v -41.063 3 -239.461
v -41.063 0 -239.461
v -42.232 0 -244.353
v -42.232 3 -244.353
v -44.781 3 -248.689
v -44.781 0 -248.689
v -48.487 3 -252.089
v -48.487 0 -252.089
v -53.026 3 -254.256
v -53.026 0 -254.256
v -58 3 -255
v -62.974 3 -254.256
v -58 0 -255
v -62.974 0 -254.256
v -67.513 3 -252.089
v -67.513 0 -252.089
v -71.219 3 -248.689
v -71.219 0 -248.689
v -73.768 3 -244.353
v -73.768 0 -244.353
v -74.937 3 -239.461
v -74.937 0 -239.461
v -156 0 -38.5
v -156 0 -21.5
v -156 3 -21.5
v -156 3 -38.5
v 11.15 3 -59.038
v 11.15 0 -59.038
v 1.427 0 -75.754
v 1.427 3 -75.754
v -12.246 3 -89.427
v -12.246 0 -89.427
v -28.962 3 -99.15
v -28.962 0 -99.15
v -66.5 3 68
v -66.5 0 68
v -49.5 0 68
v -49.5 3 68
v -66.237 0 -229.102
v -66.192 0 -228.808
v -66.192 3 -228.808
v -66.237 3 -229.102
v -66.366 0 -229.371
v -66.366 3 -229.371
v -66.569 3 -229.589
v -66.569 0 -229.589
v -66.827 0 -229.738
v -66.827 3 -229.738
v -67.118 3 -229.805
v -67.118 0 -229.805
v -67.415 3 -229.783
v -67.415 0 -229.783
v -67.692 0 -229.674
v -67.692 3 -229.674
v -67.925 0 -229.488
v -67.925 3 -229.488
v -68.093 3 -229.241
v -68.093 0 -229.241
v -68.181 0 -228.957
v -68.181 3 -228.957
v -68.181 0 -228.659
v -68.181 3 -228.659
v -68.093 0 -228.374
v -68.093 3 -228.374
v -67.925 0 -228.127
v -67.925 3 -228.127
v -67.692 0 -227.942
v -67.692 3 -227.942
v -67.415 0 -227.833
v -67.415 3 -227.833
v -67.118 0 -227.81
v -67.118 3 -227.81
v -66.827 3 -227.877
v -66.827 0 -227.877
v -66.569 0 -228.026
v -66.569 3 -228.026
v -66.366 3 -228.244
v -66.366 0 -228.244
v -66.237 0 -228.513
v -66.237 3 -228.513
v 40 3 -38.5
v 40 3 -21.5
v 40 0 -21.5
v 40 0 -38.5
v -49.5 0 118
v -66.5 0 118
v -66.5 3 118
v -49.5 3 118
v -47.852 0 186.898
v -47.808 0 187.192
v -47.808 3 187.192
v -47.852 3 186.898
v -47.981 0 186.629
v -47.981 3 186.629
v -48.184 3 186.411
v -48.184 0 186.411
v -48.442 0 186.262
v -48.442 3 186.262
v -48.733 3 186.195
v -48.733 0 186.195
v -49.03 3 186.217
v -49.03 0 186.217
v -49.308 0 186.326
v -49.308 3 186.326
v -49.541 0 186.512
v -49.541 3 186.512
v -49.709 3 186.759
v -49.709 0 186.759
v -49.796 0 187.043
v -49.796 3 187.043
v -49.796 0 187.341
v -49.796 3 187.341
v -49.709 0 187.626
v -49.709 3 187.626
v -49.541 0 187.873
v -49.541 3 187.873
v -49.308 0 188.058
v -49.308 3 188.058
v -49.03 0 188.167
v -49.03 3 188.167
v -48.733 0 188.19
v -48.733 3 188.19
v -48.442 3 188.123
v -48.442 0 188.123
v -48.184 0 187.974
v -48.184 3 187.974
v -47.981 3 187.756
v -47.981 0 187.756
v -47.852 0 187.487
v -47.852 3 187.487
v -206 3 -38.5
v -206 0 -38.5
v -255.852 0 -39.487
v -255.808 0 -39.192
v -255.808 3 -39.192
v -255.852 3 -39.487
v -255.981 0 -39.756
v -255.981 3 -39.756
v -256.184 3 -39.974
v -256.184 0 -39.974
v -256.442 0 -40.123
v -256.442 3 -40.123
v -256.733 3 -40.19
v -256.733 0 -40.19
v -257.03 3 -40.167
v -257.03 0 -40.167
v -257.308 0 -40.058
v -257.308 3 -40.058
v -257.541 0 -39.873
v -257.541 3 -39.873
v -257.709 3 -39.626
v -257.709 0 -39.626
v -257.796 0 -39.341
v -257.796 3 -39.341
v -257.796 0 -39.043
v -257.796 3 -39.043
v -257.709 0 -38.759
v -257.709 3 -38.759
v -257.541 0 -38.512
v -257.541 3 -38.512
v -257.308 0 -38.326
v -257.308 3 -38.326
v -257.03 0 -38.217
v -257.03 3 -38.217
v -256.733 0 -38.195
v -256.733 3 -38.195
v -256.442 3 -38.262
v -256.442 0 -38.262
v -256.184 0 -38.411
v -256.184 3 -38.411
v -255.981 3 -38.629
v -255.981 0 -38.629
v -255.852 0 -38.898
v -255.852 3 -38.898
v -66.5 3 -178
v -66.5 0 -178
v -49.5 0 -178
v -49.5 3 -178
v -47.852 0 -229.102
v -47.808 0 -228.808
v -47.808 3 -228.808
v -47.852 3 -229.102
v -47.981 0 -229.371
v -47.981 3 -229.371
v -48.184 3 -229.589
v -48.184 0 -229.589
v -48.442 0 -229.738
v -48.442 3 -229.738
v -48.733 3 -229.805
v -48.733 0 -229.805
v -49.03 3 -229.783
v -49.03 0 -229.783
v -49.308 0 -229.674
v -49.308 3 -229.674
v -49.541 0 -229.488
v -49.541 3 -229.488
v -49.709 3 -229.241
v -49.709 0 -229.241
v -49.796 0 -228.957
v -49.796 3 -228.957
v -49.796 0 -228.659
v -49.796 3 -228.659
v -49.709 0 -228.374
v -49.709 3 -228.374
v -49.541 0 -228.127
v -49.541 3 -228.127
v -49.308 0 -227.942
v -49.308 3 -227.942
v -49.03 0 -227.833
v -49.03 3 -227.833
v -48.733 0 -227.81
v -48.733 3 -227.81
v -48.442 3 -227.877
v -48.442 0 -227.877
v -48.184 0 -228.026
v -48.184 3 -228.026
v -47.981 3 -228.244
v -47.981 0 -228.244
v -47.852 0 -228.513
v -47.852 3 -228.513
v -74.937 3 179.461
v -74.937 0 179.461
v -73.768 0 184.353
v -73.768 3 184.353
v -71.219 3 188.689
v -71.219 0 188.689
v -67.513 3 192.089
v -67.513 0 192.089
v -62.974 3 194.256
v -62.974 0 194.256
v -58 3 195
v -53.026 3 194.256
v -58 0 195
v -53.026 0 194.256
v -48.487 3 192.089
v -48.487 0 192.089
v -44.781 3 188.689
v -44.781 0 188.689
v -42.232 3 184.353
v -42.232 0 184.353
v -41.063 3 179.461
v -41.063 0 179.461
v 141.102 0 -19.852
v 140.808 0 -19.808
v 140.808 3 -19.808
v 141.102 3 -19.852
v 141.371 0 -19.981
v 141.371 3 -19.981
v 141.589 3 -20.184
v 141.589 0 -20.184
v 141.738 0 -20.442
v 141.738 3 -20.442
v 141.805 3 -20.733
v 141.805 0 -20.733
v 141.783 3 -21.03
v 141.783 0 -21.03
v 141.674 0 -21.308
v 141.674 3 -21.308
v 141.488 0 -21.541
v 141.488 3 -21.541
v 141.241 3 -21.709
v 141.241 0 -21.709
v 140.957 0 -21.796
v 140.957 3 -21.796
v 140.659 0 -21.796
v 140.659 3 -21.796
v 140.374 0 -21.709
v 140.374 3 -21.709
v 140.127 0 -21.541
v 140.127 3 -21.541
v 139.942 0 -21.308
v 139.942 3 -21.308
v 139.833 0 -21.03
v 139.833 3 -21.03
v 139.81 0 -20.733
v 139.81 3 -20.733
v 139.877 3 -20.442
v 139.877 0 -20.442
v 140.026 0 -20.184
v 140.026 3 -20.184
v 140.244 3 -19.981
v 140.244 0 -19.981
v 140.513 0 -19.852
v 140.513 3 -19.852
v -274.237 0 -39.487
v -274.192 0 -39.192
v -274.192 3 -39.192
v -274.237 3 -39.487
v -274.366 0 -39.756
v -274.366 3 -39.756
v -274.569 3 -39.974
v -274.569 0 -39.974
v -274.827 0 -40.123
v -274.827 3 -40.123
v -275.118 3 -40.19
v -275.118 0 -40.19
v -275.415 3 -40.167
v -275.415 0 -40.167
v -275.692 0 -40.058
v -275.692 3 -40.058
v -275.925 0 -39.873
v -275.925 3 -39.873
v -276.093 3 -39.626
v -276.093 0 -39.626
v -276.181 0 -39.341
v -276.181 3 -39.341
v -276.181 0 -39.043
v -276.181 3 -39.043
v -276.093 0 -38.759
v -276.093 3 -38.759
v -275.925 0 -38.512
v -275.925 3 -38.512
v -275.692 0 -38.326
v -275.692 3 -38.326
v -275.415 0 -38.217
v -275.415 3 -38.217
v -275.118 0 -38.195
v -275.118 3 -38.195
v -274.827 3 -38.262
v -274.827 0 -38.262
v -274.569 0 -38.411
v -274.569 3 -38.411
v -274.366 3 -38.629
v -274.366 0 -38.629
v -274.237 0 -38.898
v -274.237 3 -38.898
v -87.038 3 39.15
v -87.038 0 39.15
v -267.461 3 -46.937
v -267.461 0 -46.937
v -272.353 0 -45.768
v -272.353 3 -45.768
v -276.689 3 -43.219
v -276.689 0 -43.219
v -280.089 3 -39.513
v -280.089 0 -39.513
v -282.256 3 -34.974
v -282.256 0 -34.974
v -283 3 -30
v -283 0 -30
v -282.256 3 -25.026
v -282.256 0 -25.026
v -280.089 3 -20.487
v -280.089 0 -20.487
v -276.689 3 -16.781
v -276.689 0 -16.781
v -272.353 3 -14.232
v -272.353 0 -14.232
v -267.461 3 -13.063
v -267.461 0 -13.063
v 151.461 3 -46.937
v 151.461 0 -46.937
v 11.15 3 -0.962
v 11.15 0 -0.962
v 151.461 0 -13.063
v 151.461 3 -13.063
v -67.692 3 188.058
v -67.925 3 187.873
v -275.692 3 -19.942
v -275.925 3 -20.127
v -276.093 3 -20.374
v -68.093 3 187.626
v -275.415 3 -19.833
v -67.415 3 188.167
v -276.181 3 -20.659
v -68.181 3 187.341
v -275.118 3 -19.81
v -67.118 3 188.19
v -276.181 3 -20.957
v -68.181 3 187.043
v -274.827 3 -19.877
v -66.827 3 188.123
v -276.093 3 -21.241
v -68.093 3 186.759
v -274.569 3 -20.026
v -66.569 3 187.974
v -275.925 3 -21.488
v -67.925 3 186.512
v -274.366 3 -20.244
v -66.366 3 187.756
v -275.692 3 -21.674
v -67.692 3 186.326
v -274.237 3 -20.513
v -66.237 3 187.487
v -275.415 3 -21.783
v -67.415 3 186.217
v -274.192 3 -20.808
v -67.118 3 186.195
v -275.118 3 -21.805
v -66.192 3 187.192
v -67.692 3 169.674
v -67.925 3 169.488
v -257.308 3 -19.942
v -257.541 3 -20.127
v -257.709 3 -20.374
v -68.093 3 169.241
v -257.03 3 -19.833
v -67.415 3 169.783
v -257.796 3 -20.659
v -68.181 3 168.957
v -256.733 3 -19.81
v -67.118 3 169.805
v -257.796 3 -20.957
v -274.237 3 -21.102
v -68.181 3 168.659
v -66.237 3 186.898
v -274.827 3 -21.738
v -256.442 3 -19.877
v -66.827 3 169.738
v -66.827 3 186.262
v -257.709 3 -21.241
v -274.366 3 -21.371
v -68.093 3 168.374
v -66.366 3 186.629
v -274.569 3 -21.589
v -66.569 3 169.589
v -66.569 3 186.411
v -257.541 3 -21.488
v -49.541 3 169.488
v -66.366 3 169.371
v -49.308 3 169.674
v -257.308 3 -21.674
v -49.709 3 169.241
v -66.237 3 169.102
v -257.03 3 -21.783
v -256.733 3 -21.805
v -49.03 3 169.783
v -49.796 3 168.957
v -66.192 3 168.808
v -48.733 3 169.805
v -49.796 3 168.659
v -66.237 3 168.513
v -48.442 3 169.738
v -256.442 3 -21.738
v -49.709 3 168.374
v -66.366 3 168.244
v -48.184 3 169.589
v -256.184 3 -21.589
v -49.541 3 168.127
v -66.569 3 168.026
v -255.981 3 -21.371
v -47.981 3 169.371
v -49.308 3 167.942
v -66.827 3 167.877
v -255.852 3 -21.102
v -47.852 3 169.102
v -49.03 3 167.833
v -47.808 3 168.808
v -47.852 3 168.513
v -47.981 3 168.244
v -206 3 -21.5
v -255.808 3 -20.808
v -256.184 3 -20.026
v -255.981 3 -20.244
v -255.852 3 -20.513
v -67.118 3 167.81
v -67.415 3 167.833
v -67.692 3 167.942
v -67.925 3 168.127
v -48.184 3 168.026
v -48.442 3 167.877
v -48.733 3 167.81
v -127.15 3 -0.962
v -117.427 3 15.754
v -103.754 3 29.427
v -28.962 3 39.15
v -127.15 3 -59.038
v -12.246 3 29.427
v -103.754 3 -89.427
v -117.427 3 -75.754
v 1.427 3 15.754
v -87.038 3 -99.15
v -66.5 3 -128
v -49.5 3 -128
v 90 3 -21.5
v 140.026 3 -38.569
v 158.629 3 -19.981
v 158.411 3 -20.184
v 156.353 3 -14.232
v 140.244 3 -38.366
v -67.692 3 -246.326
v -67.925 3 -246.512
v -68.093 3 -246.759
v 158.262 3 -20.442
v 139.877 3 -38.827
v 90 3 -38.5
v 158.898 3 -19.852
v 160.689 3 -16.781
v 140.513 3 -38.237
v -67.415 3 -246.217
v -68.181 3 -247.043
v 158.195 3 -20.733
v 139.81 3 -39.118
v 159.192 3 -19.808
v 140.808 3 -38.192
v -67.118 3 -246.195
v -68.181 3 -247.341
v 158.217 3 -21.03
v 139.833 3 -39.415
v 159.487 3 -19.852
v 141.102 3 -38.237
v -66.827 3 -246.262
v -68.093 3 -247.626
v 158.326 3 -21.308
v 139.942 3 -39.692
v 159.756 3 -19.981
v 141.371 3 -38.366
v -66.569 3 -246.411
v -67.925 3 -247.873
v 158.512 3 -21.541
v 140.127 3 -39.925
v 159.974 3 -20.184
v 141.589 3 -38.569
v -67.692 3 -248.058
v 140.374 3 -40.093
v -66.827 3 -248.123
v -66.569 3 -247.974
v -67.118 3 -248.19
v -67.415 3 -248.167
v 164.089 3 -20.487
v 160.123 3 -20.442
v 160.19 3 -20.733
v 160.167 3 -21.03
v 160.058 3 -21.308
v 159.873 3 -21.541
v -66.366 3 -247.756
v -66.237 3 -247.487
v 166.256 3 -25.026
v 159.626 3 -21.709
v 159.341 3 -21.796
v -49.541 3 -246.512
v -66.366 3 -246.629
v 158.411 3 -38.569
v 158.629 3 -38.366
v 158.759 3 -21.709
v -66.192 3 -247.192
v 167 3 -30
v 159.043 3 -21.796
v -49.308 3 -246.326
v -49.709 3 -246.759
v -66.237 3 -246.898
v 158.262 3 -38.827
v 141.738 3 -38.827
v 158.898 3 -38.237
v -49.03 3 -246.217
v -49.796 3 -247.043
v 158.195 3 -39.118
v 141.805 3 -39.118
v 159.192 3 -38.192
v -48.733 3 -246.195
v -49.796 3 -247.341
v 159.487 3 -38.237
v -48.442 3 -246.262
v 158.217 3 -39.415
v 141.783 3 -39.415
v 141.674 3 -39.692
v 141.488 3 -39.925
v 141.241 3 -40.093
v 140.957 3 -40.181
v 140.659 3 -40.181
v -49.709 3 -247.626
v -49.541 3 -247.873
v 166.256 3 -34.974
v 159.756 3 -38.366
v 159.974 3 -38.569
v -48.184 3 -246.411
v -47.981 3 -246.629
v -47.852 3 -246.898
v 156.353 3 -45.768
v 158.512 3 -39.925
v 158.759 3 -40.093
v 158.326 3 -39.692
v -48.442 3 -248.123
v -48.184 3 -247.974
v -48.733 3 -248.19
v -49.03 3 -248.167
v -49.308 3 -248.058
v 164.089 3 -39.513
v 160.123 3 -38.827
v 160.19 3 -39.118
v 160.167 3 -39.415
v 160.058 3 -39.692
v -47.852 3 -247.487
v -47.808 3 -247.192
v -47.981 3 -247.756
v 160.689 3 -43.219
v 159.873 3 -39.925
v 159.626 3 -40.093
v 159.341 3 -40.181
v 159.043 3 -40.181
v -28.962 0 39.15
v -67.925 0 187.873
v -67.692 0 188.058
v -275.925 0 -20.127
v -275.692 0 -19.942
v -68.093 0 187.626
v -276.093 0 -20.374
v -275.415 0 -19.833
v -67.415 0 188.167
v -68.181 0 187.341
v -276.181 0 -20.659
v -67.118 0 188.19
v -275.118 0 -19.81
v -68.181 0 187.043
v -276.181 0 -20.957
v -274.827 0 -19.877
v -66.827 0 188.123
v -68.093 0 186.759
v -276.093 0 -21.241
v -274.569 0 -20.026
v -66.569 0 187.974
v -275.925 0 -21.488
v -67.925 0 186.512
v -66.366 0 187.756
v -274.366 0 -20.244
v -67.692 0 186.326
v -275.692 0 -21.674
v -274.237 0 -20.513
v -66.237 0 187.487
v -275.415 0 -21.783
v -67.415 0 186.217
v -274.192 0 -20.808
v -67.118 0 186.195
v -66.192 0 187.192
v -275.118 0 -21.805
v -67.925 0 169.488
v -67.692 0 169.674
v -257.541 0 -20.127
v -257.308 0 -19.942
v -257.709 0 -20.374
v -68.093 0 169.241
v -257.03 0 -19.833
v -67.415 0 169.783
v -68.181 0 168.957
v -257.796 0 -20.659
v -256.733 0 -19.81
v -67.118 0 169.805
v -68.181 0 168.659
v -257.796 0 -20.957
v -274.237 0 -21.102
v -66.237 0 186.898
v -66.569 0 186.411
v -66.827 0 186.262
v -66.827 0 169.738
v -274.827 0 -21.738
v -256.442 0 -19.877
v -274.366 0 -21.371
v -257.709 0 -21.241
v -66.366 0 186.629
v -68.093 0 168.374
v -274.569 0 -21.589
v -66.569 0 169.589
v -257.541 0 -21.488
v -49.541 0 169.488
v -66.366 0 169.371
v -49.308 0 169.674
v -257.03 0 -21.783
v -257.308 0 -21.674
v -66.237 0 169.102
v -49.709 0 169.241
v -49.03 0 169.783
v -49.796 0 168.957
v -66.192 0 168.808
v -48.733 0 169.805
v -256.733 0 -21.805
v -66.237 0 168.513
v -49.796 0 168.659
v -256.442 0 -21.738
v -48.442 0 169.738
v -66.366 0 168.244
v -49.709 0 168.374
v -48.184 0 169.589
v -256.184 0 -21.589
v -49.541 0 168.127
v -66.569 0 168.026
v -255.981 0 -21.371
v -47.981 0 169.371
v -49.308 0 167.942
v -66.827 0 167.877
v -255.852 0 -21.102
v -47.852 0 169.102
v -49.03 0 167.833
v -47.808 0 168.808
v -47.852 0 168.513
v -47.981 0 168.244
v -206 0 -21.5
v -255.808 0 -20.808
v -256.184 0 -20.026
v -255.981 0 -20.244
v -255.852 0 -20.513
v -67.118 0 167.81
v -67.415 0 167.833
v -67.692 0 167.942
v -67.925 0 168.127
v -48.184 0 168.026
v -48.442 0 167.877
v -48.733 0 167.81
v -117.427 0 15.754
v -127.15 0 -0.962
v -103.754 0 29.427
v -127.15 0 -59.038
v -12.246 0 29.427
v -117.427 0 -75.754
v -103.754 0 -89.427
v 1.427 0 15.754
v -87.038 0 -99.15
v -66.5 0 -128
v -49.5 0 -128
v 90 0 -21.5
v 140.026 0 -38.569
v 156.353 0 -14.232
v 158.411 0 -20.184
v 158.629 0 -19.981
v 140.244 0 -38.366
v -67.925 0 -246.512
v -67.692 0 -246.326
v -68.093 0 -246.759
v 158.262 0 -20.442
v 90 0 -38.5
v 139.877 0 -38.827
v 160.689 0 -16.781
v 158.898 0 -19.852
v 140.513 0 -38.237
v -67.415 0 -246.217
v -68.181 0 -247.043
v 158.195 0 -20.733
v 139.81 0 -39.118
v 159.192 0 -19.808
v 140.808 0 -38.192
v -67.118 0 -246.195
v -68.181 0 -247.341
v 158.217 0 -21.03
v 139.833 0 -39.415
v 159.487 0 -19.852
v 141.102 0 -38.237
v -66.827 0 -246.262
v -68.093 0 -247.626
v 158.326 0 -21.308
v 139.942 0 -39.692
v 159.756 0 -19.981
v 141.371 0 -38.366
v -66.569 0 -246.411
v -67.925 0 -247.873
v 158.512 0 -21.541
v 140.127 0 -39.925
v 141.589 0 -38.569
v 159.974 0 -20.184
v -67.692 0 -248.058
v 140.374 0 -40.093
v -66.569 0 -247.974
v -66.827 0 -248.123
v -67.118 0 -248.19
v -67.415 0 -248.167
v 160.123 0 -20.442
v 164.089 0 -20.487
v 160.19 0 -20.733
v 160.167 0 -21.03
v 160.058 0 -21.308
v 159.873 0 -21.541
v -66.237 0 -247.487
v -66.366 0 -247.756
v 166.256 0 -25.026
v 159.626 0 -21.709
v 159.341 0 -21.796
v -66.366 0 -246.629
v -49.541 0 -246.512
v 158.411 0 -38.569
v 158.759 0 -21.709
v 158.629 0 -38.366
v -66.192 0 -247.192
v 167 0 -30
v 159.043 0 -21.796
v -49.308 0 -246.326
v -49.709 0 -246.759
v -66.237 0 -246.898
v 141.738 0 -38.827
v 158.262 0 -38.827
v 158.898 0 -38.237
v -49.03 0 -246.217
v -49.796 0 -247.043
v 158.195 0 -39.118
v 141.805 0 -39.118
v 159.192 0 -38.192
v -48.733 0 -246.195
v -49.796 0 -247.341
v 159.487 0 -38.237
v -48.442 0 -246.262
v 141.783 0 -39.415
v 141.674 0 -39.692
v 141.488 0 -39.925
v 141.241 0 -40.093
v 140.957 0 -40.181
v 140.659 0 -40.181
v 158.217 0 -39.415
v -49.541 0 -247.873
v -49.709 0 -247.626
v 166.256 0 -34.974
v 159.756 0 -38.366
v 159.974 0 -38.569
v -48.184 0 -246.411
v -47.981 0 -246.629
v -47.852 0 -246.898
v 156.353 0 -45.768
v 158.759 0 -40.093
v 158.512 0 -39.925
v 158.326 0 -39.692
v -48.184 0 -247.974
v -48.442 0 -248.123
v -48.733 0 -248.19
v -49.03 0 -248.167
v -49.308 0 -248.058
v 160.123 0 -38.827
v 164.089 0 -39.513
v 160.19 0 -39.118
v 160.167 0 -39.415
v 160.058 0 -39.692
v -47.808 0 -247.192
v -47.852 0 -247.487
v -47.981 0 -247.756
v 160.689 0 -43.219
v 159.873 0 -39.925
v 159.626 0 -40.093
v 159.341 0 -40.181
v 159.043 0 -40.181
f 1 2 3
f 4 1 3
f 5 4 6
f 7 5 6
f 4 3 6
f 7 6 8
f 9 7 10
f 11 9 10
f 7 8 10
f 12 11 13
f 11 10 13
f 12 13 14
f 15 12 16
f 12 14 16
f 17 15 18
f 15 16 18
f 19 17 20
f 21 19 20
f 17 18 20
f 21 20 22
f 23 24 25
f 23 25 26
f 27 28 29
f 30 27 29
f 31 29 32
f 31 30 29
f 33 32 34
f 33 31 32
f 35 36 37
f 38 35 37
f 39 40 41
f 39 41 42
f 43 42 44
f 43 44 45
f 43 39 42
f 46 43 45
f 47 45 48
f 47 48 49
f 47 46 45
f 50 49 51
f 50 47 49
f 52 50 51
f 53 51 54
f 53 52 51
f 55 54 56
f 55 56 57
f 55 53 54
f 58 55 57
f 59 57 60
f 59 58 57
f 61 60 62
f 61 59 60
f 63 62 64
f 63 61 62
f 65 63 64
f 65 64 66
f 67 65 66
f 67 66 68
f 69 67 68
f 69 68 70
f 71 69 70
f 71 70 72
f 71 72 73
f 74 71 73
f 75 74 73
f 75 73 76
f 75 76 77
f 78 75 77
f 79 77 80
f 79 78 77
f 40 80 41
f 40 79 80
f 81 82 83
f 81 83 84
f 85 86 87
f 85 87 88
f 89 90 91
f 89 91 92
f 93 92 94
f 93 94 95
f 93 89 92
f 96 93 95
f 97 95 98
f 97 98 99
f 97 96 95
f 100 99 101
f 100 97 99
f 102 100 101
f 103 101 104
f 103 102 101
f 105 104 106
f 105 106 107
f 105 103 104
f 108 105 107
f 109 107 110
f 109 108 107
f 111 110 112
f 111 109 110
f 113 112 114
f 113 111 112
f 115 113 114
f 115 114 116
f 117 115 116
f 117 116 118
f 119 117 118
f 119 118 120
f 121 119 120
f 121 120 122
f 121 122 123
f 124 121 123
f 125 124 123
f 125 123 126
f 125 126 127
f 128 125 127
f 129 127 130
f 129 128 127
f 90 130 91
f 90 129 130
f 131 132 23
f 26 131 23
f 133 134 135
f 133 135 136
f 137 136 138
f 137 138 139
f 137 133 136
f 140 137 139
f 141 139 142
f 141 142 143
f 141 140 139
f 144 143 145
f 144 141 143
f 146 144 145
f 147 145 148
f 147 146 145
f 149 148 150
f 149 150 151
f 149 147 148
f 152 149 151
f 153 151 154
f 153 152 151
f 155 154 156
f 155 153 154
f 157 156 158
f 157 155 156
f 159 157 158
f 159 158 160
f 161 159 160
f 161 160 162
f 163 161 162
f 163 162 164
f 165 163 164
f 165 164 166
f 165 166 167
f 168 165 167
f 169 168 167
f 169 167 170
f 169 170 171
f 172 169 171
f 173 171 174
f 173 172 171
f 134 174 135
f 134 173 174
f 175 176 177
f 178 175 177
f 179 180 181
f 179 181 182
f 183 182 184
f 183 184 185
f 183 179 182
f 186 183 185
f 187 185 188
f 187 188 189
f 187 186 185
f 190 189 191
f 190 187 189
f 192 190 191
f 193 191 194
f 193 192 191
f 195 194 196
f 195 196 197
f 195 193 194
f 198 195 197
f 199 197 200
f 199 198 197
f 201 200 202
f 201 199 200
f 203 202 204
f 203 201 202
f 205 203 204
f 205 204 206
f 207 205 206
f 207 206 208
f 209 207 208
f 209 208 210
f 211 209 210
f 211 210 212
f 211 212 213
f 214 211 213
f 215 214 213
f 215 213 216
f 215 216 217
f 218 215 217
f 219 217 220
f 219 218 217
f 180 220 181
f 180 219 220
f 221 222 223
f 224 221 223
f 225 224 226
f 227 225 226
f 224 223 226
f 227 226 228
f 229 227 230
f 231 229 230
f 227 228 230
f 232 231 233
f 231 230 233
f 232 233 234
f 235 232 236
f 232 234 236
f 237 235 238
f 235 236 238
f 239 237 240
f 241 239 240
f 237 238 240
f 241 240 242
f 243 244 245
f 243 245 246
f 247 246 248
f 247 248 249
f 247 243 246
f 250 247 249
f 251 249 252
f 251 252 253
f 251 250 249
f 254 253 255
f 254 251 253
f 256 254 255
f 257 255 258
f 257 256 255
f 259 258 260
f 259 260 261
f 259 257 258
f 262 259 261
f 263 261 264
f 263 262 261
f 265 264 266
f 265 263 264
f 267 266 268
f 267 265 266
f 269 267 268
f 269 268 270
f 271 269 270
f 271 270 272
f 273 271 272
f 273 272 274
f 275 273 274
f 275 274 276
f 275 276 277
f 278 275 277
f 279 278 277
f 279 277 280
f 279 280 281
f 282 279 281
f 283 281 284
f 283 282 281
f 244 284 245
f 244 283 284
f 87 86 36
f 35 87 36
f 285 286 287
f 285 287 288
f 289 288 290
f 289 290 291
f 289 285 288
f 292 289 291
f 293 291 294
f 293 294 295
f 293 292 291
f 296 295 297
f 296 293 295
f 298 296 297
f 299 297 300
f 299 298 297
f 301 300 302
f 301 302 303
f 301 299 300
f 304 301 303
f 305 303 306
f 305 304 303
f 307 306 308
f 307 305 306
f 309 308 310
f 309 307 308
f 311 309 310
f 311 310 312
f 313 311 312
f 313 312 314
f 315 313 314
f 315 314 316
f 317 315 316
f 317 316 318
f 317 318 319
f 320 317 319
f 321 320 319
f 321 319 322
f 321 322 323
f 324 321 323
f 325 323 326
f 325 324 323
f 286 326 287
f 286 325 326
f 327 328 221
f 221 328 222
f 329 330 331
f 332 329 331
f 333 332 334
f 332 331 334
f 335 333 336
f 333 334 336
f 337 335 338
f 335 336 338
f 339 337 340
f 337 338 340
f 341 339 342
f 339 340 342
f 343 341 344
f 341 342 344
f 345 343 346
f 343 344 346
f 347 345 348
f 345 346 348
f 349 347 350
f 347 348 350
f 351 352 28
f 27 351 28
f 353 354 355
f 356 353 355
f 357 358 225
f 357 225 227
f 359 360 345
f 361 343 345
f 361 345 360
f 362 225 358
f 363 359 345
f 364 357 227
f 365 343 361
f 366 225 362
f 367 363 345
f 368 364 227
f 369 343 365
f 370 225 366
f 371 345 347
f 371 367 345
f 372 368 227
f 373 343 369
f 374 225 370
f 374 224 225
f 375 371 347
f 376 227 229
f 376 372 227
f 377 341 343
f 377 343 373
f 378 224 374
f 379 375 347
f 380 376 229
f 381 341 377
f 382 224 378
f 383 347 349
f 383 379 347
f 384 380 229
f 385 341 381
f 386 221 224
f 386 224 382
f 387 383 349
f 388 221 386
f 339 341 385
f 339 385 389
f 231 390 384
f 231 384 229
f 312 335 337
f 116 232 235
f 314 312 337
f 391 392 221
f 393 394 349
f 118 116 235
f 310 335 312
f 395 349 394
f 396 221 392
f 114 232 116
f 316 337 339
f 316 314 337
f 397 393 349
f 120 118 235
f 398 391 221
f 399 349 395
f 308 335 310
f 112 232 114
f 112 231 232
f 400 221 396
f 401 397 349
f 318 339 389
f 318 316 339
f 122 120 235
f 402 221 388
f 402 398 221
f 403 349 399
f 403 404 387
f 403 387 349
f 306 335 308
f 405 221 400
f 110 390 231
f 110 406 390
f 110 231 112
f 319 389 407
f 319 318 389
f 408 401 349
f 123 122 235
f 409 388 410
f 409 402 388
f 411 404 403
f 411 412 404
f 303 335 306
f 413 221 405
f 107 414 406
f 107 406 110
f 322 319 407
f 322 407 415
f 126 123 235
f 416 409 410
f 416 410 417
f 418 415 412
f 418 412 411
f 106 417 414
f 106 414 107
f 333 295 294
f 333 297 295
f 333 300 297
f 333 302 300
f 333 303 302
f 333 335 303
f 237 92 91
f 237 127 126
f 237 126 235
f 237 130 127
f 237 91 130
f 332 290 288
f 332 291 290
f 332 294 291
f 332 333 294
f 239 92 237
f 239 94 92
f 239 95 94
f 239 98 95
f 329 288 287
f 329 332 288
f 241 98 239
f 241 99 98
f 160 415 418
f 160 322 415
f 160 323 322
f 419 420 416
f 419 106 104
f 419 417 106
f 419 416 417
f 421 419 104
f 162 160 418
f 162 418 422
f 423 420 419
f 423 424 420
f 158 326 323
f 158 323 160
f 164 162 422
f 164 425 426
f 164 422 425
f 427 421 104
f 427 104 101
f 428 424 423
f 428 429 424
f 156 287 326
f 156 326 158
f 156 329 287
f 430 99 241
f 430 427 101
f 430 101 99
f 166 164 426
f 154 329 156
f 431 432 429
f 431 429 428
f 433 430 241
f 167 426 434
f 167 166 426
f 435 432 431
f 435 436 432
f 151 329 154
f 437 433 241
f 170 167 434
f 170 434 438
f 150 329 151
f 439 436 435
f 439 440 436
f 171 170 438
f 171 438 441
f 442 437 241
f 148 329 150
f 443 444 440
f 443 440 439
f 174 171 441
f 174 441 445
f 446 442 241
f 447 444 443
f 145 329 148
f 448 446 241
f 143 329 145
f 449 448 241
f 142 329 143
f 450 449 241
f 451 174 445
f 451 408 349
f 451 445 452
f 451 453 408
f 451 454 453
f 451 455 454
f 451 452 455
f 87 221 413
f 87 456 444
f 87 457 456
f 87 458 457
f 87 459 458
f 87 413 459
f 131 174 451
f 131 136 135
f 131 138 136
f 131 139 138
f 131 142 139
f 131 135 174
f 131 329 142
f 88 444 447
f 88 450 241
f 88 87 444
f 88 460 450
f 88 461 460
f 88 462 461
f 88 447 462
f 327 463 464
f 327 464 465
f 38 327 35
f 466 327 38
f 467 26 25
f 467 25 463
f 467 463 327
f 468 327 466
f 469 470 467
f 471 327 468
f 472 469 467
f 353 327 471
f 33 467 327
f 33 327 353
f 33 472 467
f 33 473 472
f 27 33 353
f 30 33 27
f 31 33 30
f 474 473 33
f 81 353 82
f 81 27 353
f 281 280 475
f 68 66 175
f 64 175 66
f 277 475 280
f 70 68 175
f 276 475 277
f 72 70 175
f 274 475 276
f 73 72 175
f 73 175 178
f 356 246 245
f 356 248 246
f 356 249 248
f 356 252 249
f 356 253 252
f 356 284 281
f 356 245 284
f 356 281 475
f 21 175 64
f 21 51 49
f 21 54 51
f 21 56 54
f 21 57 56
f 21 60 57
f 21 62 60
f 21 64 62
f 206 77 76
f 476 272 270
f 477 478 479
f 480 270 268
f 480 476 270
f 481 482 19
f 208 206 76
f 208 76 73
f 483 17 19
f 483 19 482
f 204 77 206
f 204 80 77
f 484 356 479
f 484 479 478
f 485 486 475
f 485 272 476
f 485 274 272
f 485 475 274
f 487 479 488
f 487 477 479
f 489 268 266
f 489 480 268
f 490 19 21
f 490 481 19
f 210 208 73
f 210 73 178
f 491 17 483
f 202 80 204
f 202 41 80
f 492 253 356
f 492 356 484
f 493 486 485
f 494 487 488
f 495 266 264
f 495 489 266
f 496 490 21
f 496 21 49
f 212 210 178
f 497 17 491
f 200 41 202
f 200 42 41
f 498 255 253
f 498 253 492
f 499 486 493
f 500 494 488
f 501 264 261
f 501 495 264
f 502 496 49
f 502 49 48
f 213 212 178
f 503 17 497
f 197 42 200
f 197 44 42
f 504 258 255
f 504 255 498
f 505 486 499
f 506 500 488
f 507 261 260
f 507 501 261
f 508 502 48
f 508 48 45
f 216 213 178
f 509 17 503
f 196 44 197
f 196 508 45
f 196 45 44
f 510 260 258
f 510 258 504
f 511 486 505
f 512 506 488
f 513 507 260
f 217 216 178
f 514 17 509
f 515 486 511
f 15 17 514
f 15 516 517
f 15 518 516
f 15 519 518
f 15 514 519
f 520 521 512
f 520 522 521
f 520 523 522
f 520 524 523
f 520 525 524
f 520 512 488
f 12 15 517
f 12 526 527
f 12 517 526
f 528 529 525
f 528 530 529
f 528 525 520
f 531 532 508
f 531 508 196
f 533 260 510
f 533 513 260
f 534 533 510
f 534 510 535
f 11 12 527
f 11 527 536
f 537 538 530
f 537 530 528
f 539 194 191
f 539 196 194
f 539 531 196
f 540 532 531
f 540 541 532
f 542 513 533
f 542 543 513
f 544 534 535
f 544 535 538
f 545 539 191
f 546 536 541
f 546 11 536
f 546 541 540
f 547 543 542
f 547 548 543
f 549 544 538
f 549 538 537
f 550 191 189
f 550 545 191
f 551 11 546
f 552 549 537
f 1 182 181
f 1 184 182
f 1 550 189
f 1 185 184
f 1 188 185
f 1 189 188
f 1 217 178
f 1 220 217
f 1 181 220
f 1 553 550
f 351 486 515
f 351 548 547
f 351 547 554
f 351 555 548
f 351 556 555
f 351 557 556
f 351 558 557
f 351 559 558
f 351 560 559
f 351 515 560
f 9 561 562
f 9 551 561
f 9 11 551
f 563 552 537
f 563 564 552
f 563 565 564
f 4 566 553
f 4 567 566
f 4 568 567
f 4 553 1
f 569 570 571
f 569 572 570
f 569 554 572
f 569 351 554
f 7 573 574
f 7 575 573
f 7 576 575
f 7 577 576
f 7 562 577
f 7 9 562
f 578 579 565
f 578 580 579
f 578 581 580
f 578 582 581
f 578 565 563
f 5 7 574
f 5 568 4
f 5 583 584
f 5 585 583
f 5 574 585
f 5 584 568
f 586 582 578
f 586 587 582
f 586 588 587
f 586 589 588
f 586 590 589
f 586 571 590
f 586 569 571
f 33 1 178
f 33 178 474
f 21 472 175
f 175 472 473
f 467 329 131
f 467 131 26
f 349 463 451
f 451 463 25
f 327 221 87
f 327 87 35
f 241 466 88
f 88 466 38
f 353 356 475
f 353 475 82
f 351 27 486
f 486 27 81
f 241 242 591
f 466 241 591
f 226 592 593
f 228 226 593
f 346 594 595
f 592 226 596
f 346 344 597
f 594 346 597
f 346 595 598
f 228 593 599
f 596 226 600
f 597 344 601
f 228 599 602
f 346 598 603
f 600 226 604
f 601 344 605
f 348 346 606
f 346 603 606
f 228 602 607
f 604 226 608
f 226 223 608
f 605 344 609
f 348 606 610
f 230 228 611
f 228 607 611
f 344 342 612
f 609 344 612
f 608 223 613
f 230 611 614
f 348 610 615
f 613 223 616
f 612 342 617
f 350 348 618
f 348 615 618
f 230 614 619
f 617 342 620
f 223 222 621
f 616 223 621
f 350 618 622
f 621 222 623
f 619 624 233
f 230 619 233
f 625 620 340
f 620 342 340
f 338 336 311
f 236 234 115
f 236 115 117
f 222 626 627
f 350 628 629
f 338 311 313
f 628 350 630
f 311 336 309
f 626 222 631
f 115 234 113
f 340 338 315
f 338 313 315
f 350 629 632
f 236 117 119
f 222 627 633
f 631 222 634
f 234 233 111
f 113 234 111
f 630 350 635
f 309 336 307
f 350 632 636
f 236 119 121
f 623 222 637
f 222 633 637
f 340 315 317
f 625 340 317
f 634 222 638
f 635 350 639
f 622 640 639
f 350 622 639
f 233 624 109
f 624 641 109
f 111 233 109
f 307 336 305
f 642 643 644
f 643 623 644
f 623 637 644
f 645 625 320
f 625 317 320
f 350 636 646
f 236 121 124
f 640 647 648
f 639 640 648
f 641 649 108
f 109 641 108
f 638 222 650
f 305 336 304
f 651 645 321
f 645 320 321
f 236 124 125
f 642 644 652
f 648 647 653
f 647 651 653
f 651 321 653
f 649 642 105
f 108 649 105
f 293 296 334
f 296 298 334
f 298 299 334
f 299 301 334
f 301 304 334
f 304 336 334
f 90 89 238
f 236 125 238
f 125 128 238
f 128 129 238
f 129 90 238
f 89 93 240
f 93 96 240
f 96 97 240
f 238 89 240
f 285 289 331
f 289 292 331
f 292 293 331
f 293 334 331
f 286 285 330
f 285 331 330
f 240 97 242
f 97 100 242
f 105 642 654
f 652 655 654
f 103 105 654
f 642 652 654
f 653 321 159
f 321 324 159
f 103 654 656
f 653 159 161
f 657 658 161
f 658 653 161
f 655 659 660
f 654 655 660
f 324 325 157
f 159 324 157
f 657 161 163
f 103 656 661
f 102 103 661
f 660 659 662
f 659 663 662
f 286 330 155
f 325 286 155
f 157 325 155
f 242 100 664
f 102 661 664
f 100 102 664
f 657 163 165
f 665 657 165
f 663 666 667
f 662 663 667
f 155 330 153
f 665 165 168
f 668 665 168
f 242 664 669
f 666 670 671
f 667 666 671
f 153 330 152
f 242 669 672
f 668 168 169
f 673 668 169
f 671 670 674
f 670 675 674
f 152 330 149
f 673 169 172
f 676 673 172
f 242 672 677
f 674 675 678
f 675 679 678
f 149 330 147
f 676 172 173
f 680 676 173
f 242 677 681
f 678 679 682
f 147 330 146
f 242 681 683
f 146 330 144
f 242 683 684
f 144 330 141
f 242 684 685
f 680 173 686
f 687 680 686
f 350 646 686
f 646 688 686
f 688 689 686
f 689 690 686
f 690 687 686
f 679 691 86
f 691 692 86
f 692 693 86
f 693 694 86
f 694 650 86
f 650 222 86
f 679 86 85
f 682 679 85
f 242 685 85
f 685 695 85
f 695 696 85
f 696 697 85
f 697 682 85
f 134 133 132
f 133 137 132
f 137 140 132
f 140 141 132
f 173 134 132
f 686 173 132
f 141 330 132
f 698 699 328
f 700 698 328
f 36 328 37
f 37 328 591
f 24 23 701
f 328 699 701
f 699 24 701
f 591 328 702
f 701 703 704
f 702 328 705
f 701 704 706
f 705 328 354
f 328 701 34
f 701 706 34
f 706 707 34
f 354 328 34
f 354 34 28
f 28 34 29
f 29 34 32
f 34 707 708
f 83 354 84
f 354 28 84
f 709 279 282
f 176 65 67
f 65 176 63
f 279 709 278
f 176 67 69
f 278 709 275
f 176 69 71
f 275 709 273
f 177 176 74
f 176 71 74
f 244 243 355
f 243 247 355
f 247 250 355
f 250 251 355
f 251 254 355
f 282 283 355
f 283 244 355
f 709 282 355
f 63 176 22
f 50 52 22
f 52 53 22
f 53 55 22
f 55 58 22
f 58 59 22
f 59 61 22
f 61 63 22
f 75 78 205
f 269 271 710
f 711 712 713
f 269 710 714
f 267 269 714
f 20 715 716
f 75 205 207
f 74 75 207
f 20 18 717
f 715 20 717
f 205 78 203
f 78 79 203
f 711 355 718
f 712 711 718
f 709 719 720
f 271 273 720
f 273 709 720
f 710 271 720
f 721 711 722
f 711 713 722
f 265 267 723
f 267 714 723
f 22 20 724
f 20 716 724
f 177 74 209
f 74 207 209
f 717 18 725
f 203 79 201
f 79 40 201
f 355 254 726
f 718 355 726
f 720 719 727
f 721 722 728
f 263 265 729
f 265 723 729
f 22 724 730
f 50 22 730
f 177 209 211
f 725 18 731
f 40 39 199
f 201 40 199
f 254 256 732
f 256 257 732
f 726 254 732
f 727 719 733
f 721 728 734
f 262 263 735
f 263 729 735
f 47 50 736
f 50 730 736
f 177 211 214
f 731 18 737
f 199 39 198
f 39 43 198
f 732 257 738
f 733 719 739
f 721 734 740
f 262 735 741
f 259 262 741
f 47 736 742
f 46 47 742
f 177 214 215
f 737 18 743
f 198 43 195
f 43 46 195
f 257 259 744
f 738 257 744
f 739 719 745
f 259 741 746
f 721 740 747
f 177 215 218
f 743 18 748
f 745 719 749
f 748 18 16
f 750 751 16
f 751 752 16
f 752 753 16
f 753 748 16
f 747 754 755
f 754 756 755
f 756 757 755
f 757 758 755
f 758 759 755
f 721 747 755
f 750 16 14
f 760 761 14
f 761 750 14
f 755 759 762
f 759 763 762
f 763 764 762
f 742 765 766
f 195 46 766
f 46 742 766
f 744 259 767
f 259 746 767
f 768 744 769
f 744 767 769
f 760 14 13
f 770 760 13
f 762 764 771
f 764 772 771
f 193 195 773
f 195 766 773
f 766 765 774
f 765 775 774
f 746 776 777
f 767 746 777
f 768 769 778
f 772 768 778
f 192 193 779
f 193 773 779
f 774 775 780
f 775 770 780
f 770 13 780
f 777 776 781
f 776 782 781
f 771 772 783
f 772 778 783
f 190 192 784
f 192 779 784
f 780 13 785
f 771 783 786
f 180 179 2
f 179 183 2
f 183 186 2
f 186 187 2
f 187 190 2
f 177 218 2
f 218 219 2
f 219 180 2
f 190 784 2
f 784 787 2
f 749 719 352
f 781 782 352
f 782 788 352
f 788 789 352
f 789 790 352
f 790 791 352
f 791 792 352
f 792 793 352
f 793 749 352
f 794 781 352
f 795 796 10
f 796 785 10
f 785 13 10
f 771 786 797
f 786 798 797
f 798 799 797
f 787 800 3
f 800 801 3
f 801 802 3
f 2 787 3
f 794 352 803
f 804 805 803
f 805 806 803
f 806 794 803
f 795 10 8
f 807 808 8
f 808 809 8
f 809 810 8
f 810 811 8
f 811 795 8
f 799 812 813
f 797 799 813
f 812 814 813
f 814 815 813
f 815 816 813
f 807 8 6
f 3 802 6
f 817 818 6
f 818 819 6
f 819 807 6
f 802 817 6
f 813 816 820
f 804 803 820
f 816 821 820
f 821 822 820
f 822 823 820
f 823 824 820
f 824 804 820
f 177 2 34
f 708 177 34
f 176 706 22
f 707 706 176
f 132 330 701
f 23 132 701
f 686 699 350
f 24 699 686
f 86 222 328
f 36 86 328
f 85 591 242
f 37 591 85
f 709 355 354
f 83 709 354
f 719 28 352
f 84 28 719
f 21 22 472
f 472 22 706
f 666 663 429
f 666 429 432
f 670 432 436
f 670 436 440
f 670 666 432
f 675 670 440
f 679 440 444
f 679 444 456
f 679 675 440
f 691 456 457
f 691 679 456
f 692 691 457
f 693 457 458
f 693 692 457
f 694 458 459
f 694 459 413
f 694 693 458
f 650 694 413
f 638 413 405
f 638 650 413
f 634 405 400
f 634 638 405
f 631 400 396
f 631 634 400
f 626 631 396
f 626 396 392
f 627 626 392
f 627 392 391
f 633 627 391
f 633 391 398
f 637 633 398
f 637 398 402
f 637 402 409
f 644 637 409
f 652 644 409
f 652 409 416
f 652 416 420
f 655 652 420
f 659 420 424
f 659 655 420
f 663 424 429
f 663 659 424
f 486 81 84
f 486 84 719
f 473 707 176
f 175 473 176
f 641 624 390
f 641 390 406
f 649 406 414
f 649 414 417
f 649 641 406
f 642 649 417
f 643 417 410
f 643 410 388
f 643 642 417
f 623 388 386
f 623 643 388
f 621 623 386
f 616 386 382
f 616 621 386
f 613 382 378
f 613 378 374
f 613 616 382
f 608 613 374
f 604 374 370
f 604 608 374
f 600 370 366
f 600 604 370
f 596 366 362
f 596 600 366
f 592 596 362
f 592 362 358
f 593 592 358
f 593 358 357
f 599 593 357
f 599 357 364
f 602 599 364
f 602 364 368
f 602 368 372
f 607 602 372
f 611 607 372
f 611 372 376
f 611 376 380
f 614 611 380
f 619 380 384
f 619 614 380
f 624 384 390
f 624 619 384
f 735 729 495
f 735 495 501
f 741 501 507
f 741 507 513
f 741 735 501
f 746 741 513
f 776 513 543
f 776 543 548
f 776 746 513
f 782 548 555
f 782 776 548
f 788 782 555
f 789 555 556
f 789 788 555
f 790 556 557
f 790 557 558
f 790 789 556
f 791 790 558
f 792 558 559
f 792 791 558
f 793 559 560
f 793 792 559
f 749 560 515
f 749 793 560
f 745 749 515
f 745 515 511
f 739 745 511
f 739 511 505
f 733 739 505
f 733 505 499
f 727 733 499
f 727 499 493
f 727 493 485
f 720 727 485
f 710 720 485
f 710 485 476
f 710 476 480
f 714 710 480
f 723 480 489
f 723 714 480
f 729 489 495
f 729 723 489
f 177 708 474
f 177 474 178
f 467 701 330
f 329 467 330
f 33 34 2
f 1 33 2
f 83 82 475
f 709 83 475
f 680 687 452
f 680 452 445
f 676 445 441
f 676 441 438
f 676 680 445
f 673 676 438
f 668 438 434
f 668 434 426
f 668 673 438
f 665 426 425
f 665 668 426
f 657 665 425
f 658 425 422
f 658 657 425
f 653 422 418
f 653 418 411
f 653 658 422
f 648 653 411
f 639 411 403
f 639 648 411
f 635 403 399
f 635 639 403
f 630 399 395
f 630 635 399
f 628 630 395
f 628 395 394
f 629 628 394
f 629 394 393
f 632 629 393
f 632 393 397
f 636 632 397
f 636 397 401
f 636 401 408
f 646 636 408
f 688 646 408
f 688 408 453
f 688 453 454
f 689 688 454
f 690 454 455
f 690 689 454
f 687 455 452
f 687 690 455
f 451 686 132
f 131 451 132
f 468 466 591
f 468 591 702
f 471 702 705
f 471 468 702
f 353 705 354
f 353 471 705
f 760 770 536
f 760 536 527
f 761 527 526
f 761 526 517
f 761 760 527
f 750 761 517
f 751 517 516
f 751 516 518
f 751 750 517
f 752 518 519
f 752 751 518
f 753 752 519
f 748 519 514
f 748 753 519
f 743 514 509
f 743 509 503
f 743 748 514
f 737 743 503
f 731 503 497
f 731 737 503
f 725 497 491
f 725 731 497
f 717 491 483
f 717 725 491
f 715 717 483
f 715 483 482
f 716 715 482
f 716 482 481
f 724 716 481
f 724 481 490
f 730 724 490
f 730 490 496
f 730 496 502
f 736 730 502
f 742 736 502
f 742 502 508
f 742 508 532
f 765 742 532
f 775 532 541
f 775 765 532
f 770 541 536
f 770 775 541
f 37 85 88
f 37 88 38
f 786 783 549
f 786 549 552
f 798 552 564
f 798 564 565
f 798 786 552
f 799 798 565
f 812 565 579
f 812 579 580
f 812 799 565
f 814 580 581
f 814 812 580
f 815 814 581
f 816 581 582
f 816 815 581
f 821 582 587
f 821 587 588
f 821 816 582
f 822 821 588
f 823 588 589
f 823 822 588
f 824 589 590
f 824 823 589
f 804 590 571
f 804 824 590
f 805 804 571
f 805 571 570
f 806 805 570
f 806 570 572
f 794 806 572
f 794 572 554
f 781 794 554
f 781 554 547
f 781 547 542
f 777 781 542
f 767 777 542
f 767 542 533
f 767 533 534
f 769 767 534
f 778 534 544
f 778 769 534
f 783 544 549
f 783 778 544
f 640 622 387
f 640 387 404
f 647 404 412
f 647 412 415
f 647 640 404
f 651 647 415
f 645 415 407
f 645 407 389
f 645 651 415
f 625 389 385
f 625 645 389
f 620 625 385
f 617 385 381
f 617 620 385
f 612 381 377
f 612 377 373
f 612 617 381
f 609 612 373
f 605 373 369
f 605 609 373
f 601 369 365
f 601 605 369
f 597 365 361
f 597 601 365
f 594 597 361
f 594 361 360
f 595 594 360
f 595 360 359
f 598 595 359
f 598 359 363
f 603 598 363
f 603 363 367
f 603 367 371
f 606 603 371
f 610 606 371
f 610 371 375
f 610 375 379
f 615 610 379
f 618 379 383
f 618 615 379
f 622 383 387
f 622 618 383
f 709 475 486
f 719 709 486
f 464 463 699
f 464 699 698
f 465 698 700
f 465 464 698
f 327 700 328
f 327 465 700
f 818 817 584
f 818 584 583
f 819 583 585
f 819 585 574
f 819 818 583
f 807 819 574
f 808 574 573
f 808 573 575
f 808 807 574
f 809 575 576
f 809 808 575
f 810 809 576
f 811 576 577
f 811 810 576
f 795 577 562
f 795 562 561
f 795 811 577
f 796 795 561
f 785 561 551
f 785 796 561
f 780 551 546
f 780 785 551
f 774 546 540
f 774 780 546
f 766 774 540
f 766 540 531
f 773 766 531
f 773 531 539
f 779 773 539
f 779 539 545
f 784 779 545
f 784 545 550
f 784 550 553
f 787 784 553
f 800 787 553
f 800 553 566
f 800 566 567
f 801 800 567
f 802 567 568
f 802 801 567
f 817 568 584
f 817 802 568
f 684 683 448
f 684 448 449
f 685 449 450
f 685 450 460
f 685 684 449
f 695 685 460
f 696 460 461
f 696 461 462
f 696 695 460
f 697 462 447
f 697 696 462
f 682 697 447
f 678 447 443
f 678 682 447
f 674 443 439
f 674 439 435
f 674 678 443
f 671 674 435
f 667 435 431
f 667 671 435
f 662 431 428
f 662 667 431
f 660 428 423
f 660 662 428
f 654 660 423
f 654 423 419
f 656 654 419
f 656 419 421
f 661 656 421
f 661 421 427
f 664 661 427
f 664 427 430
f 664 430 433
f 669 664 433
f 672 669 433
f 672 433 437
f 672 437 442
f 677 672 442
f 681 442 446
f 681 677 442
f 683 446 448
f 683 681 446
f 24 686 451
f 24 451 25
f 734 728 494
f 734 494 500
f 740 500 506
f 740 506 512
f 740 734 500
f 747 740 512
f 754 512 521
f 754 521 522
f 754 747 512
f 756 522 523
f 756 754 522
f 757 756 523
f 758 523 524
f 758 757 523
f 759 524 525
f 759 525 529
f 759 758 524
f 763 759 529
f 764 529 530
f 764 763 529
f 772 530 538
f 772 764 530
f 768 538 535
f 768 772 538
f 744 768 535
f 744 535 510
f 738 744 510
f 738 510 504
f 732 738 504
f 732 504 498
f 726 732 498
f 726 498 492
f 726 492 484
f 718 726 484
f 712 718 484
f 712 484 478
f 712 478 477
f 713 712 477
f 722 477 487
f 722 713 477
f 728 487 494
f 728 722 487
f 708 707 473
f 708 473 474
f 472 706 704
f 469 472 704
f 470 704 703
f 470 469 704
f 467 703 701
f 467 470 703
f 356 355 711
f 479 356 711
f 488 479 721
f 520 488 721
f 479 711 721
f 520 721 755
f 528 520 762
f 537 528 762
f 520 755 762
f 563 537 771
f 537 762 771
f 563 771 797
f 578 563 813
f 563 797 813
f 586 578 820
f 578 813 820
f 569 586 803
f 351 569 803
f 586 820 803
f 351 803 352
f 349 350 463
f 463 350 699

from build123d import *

# Parameters (mm, degrees)
SKETCH1_R               = 1
BOSS_EXTRUDE1_DEPTH     = 3
SKETCH2_W               = 50
SKETCH2_H               = 17
CUT_EXTRUDE1_DEPTH      = 178.476759042
SKETCH3_R               = 75
BOSS_EXTRUDE2_DEPTH     = 3
CIRPATTERN1_OUTLINE_R   = 1
CIRPATTERN1_OUTLINE_W   = 17
CIRPATTERN1_OUTLINE_H   = 50
CIRPATTERN1_OUTLINE_W_2 = 50
CIRPATTERN1_OUTLINE_H_2 = 17
CIRPATTERN1_DEPTH       = 3


# Read off the part's stored shape, not the designer's step: CirPattern1
with BuildPart() as part:
    # Sketch1 → Boss-Extrude1 (new body)
    with BuildSketch(Plane(origin=(0, 0, 0), x_dir=(1, 0, 0), z_dir=(0, 1, 0))):
        with BuildLine():
            Line((0, 0), (151.460758228, 13.062875527))
            ThreePointArc((151.460758228, 13.062875527), (167, 30), (151.460758228, 46.937124473))
            Line((151.460758228, 46.937124473), (0, 60))
            Line((0, 60), (0, 0))
        make_face()
        with Locations(Location((140.807611845, 39.192388155, 0), (0, 0, 270))):
            Circle(SKETCH1_R, mode=Mode.SUBTRACT)
        with Locations(Location((140.807611845, 20.807611845, 0), (0, 0, 270))):
            Circle(SKETCH1_R, mode=Mode.SUBTRACT)
        with Locations(Location((159.192388155, 20.807611845, 0), (0, 0, 270))):
            Circle(SKETCH1_R, mode=Mode.SUBTRACT)
        with Locations(Location((159.192388155, 39.192388155, 0), (0, 0, 270))):
            Circle(SKETCH1_R, mode=Mode.SUBTRACT)
    extrude(amount=BOSS_EXTRUDE1_DEPTH)

    # Sketch2 → Cut-Extrude1 (cut, through all)
    with BuildSketch(Plane(origin=(0, 3, 0), x_dir=(1, 0, 0), z_dir=(0, 1, 0))):
        with Locations((65, 30)):
            Rectangle(SKETCH2_W, SKETCH2_H)
    extrude(amount=-CUT_EXTRUDE1_DEPTH, mode=Mode.SUBTRACT)

    # Sketch3 → Boss-Extrude2 (add)
    with BuildSketch(Plane(origin=(0, 3, 0), x_dir=(1, 0, 0), z_dir=(0, 1, 0))):
        with Locations((-58, 30)):
            Circle(SKETCH3_R)
    extrude(amount=-BOSS_EXTRUDE2_DEPTH)

    # CirPattern1 outline → CirPattern1 (add)
    # profile 1 of 3: a face of its own
    with BuildSketch(Plane(origin=(0, 0, 0), x_dir=(1, 0, 0), z_dir=(0, 1, 0))):
        with BuildLine():
            ThreePointArc((-28.961675415, -39.150384708), (-58, -45), (-87.038324585, -39.150384708))
            Line((-87.038324585, -39.150384708), (-74.937124473, -179.460758228))
            ThreePointArc((-74.937124473, -179.460758228), (-58, -195), (-41.062875527, -179.460758228))
            Line((-41.062875527, -179.460758228), (-28.961675415, -39.150384708))
        make_face()
        with Locations((-67.192388155, -187.192388155)):
            Circle(CIRPATTERN1_OUTLINE_R, mode=Mode.SUBTRACT)
        with Locations((-67.192388155, -168.807611845)):
            Circle(CIRPATTERN1_OUTLINE_R, mode=Mode.SUBTRACT)
        with Locations((-48.807611845, -187.192388155)):
            Circle(CIRPATTERN1_OUTLINE_R, mode=Mode.SUBTRACT)
        with Locations((-48.807611845, -168.807611845)):
            Circle(CIRPATTERN1_OUTLINE_R, mode=Mode.SUBTRACT)
        with Locations((-58, -93)):
            Rectangle(CIRPATTERN1_OUTLINE_W, CIRPATTERN1_OUTLINE_H, mode=Mode.SUBTRACT)
    # profile 2 of 3: a face of its own
    with BuildSketch(Plane(origin=(0, 0, 0), x_dir=(1, 0, 0), z_dir=(0, 1, 0))):
        with BuildLine():
            ThreePointArc((-127.150384708, 0.961675415), (-133, 30), (-127.150384708, 59.038324585))
            Line((-127.150384708, 59.038324585), (-267.460758228, 46.937124473))
            ThreePointArc((-267.460758228, 46.937124473), (-283, 30), (-267.460758228, 13.062875527))
            Line((-267.460758228, 13.062875527), (-127.150384708, 0.961675415))
        make_face()
        with Locations((-275.192388155, 20.807611845)):
            Circle(CIRPATTERN1_OUTLINE_R, mode=Mode.SUBTRACT)
        with Locations((-256.807611845, 20.807611845)):
            Circle(CIRPATTERN1_OUTLINE_R, mode=Mode.SUBTRACT)
        with Locations((-275.192388155, 39.192388155)):
            Circle(CIRPATTERN1_OUTLINE_R, mode=Mode.SUBTRACT)
        with Locations((-256.807611845, 39.192388155)):
            Circle(CIRPATTERN1_OUTLINE_R, mode=Mode.SUBTRACT)
        with Locations((-181, 30)):
            Rectangle(CIRPATTERN1_OUTLINE_W_2, CIRPATTERN1_OUTLINE_H_2, mode=Mode.SUBTRACT)
    # profile 3 of 3: a face of its own
    with BuildSketch(Plane(origin=(0, 0, 0), x_dir=(1, 0, 0), z_dir=(0, 1, 0))):
        with BuildLine():
            ThreePointArc((-41.062875527, 239.460758228), (-58, 255), (-74.937124473, 239.460758228))
            Line((-74.937124473, 239.460758228), (-87.038324585, 99.150384708))
            ThreePointArc((-87.038324585, 99.150384708), (-58, 105), (-28.961675415, 99.150384708))
            Line((-28.961675415, 99.150384708), (-41.062875527, 239.460758228))
        make_face()
        with Locations((-58, 153)):
            Rectangle(CIRPATTERN1_OUTLINE_W, CIRPATTERN1_OUTLINE_H, mode=Mode.SUBTRACT)
        with Locations((-67.192388155, 228.807611845)):
            Circle(CIRPATTERN1_OUTLINE_R, mode=Mode.SUBTRACT)
        with Locations((-67.192388155, 247.192388155)):
            Circle(CIRPATTERN1_OUTLINE_R, mode=Mode.SUBTRACT)
        with Locations((-48.807611845, 228.807611845)):
            Circle(CIRPATTERN1_OUTLINE_R, mode=Mode.SUBTRACT)
        with Locations((-48.807611845, 247.192388155)):
            Circle(CIRPATTERN1_OUTLINE_R, mode=Mode.SUBTRACT)
    extrude(amount=CIRPATTERN1_DEPTH)


solid = part.part
